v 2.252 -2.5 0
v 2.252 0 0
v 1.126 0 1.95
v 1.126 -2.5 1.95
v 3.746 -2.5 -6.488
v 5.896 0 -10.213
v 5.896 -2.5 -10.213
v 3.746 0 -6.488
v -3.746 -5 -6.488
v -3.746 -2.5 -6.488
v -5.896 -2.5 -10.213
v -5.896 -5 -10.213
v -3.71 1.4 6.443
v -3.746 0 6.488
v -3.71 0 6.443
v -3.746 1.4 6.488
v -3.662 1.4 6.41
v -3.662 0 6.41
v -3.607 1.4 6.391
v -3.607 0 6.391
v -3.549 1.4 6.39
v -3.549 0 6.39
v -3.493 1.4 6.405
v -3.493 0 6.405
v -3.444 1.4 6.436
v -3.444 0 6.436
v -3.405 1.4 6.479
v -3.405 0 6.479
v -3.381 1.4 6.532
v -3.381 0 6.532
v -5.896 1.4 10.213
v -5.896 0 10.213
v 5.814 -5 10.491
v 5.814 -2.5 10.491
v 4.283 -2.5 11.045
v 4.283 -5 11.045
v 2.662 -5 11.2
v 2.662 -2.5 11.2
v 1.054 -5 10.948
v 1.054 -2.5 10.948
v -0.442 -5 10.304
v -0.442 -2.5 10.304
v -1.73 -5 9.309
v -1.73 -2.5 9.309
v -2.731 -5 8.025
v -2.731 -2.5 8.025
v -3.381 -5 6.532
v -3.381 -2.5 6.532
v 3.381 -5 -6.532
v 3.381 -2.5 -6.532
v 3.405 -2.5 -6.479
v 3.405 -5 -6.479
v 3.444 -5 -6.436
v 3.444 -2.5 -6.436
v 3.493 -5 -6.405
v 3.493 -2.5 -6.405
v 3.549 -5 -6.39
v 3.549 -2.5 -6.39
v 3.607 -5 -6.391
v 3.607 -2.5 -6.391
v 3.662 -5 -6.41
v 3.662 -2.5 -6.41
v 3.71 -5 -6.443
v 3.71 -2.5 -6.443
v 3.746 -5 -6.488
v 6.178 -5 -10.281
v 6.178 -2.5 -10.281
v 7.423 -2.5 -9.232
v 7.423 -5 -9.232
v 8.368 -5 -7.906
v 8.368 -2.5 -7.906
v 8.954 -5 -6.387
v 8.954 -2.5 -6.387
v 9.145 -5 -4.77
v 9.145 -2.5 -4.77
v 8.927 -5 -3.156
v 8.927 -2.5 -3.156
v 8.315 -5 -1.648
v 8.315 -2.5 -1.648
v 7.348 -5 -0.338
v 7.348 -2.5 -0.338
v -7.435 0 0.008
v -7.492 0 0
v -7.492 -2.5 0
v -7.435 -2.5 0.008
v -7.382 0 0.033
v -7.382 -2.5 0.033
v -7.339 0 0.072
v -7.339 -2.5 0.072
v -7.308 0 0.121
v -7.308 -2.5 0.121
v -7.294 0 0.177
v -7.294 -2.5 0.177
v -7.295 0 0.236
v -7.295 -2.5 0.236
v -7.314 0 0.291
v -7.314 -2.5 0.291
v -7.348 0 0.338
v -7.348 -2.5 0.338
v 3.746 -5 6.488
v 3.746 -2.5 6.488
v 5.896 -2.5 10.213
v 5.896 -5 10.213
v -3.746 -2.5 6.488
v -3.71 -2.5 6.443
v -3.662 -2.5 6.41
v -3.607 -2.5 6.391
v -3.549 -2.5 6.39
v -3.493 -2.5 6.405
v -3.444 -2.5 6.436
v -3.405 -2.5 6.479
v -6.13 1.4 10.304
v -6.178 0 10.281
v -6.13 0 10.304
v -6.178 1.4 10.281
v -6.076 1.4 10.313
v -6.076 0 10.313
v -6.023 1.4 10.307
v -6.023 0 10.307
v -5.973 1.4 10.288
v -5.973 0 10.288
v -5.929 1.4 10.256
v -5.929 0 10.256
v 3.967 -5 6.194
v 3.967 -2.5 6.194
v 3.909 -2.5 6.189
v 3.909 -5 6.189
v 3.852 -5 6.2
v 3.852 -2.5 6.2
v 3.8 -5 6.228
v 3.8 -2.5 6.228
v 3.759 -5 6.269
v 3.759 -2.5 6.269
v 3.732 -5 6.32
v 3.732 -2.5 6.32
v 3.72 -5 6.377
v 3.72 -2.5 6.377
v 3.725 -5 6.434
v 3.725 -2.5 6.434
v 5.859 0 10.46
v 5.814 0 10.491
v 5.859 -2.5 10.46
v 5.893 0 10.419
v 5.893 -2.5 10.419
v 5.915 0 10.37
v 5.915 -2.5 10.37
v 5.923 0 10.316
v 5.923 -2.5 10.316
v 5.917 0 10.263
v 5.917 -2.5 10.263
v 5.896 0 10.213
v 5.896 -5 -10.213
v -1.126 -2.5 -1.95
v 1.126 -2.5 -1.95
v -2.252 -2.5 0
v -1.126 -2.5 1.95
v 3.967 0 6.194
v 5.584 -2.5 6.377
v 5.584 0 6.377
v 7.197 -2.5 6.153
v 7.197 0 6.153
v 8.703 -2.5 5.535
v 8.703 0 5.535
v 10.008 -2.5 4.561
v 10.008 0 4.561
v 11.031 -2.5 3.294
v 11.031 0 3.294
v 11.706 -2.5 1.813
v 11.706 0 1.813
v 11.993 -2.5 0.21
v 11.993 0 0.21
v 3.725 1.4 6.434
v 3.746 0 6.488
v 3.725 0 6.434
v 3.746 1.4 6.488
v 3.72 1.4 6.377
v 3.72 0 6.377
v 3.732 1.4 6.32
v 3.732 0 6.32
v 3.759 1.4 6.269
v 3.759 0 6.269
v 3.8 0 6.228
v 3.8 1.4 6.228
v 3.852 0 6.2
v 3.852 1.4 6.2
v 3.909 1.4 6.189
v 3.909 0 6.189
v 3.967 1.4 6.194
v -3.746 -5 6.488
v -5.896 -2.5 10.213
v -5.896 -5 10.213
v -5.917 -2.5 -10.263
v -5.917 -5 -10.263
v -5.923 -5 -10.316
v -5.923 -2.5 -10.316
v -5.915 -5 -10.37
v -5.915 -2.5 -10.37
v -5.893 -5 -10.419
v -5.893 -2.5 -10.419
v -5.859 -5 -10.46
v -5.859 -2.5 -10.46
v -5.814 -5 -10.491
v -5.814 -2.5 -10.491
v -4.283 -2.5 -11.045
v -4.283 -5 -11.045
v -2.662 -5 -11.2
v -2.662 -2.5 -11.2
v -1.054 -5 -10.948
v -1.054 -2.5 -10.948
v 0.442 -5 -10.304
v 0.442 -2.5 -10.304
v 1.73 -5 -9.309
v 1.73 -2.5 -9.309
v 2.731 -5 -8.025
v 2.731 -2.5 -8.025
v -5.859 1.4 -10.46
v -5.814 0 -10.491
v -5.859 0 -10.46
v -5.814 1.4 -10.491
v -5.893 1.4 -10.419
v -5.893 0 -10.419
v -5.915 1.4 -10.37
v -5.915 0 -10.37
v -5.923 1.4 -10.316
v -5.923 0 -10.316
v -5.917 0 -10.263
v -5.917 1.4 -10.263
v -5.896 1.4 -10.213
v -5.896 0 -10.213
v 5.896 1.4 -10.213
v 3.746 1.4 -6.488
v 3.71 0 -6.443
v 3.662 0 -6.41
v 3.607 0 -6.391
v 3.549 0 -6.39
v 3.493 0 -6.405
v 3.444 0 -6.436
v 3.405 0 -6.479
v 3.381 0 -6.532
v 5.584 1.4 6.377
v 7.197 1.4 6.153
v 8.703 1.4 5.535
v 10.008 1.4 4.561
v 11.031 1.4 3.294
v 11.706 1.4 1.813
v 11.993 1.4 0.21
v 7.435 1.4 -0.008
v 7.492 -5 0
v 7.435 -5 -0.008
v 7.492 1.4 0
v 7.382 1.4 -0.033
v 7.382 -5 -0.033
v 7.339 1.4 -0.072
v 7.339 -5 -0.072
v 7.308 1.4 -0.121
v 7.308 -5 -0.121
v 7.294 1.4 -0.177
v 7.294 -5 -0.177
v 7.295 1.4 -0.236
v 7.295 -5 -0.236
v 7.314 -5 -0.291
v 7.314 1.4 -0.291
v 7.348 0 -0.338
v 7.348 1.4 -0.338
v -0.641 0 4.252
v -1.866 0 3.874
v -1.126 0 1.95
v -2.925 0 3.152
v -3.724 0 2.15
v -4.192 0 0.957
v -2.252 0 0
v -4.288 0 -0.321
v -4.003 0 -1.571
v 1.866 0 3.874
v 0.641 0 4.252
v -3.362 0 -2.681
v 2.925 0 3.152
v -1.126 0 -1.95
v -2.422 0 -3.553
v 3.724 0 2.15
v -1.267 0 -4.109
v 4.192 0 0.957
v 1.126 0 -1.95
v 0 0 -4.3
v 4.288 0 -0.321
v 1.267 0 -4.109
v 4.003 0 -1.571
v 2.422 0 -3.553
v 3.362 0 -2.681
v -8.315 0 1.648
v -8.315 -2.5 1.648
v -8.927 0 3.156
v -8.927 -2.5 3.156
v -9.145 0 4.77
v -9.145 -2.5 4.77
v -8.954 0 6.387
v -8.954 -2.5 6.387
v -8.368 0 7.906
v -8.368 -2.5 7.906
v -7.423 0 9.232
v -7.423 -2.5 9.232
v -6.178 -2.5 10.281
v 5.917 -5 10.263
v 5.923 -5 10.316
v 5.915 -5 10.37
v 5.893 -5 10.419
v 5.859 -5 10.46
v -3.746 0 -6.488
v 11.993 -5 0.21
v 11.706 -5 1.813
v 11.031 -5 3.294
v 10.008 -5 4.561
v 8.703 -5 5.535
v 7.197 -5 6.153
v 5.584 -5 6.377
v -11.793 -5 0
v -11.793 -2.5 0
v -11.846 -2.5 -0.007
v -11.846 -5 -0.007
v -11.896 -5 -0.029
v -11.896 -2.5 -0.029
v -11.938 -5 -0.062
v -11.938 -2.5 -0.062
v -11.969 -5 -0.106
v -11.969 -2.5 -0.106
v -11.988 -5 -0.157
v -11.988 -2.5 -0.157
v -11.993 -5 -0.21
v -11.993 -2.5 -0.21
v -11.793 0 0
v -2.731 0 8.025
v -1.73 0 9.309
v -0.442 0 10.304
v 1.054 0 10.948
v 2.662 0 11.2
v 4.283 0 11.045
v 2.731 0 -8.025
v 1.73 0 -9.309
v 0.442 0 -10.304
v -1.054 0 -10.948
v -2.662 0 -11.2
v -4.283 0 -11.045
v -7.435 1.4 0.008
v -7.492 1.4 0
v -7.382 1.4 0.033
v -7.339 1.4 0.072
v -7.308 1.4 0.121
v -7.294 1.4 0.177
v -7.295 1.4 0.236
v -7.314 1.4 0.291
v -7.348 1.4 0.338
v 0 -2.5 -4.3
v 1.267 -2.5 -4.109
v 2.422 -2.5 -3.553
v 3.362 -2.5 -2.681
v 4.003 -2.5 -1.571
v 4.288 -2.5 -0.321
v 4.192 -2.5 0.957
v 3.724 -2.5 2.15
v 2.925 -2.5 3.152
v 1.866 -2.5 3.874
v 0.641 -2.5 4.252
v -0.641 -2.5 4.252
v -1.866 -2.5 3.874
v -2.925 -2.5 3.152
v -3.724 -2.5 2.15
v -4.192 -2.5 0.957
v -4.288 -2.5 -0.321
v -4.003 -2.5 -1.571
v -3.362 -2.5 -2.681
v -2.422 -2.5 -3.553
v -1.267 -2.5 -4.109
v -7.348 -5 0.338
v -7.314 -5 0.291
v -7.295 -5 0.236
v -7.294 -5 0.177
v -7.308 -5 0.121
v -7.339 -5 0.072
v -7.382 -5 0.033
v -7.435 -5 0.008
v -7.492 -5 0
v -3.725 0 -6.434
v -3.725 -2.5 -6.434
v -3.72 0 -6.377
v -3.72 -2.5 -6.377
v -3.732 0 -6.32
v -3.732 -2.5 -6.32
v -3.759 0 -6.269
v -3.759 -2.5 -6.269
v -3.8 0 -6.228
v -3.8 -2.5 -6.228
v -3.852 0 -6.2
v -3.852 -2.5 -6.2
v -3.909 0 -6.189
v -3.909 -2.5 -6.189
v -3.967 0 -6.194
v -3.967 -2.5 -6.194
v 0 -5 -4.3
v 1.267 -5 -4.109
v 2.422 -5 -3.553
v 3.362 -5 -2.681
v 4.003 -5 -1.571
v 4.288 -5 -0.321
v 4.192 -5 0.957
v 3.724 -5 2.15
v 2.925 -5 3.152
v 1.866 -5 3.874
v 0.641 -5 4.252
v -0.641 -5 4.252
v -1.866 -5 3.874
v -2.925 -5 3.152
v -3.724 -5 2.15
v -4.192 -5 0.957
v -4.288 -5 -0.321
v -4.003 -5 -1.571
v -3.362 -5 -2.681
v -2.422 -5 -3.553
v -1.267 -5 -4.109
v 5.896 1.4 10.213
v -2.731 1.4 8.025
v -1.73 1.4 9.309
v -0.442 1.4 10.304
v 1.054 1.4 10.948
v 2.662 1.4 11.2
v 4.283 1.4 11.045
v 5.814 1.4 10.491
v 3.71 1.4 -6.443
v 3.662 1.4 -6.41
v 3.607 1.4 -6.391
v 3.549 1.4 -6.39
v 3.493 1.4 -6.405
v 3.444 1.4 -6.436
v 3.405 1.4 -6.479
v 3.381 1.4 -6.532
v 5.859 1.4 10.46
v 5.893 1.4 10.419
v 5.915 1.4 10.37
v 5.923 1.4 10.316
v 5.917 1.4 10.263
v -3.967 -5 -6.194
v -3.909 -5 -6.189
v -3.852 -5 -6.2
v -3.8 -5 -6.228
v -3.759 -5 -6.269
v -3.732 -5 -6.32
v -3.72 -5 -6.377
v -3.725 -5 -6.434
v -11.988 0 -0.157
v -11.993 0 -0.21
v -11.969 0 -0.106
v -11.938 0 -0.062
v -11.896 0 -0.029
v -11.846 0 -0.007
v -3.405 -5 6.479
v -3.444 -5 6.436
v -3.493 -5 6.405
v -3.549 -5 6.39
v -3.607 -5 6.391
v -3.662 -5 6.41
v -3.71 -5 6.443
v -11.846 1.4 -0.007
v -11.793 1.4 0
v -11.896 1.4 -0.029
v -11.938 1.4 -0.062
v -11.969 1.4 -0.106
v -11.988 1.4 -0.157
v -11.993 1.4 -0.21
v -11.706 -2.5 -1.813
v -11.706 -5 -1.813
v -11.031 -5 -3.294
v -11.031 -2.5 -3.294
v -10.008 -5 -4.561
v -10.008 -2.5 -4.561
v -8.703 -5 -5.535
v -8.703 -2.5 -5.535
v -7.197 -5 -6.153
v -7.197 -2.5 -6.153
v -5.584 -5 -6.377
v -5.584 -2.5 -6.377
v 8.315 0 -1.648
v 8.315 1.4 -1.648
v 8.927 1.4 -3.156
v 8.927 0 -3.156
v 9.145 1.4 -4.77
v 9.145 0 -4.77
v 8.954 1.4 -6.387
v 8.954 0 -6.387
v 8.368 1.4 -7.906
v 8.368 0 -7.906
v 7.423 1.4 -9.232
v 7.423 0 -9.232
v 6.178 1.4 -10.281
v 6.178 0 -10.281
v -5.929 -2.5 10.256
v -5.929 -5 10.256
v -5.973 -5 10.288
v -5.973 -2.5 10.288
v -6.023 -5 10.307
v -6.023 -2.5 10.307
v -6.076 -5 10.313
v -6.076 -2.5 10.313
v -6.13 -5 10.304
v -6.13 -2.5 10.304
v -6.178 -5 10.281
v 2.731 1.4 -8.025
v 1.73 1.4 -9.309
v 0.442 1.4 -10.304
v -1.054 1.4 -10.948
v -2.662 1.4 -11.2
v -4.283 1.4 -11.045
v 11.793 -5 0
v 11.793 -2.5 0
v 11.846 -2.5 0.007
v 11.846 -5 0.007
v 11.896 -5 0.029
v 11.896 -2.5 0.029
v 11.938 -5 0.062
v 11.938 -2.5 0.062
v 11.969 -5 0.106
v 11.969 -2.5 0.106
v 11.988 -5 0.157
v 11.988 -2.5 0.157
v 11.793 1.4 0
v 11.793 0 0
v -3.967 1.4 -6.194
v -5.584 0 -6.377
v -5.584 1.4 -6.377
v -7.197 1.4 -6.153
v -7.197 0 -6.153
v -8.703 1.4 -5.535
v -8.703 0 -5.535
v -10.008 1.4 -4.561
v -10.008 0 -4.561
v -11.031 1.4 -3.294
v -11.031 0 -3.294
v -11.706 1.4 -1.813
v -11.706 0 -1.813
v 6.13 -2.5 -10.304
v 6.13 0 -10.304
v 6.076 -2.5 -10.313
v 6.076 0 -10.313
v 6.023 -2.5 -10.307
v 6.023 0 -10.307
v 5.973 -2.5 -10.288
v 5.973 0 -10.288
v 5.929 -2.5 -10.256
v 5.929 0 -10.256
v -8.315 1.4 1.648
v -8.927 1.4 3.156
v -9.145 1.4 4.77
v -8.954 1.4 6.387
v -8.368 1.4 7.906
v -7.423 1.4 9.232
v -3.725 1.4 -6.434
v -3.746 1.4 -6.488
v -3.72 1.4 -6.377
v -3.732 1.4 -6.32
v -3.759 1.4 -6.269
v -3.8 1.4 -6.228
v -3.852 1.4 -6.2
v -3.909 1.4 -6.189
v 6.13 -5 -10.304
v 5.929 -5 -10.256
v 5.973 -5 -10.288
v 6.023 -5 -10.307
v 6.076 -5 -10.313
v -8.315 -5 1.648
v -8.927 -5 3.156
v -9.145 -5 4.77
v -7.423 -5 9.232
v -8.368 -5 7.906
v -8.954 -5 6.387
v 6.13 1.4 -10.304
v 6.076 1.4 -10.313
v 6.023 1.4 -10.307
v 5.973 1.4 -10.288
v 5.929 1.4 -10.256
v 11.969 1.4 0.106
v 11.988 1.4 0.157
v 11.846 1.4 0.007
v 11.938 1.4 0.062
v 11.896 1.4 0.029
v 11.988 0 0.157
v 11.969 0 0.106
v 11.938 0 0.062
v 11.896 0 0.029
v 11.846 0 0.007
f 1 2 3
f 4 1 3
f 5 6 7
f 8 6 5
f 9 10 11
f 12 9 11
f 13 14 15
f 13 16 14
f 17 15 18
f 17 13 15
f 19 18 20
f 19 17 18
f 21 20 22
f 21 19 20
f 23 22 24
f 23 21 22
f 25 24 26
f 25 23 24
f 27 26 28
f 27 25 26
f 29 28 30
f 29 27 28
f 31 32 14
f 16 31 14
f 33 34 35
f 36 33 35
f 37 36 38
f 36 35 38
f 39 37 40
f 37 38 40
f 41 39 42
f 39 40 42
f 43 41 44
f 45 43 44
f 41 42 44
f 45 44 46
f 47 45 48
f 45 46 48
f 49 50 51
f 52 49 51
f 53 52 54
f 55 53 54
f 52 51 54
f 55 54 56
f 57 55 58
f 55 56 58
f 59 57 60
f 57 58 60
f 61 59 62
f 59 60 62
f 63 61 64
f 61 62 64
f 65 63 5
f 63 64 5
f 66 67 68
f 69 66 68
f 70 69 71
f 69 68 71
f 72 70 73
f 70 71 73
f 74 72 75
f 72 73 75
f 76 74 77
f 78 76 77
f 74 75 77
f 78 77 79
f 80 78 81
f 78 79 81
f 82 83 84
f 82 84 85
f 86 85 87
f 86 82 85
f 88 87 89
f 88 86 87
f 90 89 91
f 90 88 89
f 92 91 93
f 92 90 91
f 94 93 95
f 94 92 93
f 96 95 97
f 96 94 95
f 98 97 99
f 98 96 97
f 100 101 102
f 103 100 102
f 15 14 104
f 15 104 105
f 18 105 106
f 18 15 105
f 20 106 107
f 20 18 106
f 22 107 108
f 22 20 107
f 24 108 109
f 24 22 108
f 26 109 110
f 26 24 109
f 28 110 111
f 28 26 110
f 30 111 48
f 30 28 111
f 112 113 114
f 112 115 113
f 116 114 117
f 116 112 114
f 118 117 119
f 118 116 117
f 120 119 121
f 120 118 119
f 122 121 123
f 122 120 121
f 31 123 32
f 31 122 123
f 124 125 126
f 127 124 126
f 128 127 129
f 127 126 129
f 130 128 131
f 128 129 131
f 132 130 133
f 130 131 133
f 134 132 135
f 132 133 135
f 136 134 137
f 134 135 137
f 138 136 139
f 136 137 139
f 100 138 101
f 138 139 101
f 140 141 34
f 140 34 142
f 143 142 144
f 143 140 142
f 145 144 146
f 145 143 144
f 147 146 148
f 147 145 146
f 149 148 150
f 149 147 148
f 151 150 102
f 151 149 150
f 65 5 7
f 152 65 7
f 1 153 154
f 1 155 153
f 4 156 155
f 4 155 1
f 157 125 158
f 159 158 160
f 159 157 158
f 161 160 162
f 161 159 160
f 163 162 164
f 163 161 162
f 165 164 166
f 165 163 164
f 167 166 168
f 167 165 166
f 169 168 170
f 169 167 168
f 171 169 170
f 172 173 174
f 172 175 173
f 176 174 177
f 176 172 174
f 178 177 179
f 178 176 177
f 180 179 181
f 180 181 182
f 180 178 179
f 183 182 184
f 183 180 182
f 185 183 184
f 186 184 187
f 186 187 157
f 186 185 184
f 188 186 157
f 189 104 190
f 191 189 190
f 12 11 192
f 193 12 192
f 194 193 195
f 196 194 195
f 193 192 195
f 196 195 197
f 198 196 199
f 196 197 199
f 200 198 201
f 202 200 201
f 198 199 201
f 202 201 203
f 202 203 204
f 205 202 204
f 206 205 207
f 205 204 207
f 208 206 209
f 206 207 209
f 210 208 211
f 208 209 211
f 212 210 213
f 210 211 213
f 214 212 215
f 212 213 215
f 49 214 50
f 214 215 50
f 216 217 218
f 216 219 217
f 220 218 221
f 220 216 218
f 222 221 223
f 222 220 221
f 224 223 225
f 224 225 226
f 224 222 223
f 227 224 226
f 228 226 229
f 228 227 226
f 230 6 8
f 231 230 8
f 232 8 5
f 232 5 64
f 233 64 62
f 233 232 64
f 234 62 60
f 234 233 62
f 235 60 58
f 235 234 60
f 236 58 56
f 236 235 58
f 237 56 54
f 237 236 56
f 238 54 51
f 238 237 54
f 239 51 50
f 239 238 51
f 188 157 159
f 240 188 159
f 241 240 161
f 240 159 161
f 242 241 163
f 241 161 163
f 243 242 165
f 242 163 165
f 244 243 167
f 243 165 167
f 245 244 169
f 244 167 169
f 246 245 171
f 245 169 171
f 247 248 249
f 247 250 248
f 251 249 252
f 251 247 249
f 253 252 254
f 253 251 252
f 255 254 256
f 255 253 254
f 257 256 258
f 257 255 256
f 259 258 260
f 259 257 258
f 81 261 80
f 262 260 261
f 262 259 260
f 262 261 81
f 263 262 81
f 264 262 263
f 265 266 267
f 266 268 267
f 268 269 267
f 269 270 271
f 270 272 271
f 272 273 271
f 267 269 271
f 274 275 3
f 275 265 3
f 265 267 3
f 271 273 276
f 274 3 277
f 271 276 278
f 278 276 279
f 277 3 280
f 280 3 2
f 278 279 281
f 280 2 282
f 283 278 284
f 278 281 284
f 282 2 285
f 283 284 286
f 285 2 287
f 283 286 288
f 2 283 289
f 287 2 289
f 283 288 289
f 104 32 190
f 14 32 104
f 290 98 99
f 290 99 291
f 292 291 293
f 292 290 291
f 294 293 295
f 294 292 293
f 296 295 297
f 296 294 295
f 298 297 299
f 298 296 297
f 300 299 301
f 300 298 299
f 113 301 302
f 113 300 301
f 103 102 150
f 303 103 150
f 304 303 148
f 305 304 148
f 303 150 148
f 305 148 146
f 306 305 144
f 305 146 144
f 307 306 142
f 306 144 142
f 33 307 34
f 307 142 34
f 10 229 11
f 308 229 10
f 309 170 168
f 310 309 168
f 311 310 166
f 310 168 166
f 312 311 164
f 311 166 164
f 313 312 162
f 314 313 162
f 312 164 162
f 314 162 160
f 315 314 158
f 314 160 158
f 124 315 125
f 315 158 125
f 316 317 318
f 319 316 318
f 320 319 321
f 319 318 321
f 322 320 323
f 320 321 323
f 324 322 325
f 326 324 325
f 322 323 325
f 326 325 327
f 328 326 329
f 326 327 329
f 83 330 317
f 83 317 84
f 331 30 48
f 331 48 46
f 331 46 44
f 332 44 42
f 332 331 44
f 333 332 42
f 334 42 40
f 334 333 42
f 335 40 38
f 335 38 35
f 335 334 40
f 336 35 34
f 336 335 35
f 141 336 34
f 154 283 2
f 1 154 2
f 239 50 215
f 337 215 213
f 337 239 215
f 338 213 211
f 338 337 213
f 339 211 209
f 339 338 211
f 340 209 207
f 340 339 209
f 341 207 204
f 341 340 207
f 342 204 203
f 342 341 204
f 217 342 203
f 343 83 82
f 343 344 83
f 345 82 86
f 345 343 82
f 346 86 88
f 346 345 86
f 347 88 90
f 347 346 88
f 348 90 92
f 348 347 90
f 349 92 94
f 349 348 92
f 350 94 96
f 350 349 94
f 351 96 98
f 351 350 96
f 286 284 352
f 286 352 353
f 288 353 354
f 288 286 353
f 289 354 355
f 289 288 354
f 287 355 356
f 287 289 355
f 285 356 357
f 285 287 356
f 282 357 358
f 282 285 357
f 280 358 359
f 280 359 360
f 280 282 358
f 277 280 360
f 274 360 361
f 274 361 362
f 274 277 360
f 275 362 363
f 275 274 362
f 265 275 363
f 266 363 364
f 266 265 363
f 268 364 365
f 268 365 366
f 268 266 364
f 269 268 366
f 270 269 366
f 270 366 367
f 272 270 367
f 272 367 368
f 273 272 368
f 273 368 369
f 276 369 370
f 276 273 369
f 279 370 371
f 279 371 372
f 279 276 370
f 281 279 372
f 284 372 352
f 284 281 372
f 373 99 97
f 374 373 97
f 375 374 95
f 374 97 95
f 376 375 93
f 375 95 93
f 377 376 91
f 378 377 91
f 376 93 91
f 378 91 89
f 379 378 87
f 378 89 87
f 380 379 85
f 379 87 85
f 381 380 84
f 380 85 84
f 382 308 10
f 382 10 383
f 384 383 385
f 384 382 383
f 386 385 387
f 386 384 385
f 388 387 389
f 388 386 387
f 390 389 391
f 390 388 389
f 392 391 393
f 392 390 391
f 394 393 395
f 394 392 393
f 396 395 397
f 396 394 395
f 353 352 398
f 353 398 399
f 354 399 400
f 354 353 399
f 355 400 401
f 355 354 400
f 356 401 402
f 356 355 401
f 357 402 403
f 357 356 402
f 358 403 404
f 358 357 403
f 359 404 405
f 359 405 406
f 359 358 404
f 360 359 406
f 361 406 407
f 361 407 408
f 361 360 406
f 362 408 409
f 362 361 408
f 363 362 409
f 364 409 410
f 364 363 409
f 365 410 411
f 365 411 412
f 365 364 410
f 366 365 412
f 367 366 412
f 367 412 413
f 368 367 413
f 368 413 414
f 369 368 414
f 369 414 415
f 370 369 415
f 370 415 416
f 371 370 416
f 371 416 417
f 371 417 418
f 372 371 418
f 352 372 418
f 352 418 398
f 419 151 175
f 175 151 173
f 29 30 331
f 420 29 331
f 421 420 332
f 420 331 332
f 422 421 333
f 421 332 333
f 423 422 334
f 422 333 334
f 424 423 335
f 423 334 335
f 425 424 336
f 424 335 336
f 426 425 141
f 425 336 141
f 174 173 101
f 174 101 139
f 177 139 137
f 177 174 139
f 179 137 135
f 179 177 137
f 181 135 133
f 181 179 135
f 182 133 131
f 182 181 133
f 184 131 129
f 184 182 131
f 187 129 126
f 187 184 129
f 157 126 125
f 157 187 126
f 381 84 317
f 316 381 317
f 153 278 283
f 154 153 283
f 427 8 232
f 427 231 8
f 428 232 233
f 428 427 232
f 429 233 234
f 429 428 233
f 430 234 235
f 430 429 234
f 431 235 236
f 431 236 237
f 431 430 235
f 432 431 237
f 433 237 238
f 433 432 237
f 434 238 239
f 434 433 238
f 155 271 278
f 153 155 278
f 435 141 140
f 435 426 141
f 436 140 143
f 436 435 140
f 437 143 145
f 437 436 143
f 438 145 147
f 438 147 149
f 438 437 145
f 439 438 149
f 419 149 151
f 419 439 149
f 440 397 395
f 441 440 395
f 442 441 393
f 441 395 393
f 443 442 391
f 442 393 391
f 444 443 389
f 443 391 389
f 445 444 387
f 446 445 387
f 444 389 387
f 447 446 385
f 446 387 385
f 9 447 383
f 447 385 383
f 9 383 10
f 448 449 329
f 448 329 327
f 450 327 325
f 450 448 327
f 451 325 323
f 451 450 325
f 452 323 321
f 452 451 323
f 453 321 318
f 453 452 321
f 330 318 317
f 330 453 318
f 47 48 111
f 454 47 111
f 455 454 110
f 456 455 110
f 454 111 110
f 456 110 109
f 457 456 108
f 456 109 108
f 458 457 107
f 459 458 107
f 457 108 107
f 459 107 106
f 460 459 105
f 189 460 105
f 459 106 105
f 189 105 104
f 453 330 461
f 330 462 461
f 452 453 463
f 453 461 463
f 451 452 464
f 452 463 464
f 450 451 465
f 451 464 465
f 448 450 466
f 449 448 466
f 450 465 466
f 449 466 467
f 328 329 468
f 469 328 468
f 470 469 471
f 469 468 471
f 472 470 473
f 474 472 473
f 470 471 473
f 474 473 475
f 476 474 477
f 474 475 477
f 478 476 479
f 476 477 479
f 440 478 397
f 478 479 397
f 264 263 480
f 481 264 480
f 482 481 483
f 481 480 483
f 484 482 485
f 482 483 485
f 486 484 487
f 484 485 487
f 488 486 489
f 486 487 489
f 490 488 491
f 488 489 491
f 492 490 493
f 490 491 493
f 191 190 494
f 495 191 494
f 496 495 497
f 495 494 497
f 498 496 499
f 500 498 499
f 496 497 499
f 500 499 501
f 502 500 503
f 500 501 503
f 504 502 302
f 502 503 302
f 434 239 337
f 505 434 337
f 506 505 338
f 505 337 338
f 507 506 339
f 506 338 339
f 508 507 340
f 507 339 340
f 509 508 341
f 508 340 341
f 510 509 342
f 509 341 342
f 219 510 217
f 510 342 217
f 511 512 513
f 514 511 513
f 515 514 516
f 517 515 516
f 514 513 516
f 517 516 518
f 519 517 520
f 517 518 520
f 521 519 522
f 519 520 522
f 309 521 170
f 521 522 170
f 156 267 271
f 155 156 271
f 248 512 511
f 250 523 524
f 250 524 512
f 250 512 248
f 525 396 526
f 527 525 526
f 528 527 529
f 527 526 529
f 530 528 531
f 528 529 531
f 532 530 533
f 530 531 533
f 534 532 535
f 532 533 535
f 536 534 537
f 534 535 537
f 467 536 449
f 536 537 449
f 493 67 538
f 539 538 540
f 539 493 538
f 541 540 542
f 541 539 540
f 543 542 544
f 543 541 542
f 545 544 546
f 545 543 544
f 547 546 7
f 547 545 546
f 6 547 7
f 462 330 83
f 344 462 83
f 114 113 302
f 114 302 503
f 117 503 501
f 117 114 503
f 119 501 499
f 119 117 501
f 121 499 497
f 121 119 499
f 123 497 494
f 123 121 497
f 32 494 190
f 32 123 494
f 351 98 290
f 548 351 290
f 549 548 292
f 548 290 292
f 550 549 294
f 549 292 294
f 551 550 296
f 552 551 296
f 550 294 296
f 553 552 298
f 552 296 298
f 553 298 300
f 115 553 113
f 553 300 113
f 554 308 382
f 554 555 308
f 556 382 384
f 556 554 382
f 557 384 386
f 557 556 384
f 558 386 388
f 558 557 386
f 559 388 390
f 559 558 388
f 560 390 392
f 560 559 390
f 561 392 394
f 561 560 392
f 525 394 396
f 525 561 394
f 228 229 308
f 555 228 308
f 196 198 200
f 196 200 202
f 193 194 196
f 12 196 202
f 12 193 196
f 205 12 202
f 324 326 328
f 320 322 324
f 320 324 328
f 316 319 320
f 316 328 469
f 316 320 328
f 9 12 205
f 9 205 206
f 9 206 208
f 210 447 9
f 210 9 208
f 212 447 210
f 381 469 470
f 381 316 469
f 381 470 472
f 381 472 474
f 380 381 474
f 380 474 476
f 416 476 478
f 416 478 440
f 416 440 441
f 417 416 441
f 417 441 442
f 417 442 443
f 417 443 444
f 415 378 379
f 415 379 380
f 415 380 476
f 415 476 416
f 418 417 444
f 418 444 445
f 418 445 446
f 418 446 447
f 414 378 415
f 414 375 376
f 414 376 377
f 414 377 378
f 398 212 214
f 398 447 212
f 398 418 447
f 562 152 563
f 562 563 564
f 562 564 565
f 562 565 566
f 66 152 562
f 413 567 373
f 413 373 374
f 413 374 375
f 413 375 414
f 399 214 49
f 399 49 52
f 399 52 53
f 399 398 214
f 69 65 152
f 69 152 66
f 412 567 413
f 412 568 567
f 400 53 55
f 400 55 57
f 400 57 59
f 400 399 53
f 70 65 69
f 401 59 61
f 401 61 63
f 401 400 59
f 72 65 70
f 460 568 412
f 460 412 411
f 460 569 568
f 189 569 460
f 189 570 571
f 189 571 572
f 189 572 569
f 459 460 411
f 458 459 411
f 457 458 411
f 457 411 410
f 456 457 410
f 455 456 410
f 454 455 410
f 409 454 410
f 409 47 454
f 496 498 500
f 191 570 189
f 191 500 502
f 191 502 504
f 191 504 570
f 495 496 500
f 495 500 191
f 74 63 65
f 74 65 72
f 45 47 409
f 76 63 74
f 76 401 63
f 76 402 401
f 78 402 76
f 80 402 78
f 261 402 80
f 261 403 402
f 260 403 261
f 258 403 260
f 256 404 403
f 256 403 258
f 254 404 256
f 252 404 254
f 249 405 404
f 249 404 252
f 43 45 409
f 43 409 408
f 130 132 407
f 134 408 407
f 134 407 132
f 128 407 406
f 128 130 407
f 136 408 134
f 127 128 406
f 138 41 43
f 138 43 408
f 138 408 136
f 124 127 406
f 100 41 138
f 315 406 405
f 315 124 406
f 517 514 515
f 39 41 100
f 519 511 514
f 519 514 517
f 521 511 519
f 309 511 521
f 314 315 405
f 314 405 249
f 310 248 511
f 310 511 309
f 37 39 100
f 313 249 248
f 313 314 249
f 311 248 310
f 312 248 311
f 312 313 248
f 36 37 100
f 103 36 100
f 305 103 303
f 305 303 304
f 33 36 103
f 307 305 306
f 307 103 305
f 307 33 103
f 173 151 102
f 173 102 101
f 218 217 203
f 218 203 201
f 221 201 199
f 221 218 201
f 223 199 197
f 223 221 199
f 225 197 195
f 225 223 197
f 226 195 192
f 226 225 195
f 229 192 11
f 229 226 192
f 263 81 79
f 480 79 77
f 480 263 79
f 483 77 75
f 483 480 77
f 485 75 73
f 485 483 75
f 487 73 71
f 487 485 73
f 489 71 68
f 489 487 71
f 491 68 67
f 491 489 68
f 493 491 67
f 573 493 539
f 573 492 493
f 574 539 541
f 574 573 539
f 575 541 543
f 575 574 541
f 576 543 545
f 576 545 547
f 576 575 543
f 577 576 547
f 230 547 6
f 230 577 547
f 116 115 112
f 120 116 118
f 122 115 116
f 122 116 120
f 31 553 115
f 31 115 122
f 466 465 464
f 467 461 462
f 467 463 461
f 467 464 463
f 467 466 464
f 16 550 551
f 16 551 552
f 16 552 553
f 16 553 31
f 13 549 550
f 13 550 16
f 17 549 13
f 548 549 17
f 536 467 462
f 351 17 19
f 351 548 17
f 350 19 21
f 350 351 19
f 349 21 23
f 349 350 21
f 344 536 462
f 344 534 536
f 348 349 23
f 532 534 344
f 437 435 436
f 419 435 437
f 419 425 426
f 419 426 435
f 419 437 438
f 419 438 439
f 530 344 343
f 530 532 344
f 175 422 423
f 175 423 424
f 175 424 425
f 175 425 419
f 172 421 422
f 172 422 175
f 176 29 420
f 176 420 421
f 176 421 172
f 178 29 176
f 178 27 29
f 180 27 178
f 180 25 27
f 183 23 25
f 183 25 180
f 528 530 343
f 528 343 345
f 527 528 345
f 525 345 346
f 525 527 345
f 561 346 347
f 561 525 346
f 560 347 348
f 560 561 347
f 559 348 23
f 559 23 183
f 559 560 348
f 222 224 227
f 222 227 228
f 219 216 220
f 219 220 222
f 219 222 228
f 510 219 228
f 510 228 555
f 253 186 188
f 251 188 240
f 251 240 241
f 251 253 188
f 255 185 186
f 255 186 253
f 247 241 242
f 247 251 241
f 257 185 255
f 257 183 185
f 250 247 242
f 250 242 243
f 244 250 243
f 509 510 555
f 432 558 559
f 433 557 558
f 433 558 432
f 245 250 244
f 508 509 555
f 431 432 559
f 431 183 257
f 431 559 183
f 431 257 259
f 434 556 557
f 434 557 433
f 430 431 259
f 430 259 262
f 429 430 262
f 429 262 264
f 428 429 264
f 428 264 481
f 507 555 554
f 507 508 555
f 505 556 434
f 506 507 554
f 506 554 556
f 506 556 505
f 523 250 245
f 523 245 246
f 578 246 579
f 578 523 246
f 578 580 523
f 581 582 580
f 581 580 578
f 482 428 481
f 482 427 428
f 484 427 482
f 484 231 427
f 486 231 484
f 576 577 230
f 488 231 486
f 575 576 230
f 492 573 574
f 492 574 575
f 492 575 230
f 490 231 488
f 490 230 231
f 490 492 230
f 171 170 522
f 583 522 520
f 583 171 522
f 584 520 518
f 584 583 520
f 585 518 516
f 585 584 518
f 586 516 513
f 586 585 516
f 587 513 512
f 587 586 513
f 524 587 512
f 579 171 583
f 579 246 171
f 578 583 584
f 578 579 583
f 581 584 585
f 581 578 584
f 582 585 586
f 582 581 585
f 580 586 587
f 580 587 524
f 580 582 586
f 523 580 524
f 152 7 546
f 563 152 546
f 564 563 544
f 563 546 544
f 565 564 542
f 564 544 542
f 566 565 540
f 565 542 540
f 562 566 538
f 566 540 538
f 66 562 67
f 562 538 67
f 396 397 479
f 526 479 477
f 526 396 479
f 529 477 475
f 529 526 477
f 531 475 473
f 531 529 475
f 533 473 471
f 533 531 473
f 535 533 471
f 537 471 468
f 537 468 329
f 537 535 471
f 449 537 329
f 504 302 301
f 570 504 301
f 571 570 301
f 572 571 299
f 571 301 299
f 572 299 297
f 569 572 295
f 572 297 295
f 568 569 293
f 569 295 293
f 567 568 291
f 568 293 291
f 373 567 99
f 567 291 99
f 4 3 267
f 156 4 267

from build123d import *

# Parameters (mm, degrees)
BOSS_EXTRUDE1_DEPTH = 1.4
FILLET1_R           = 0.2
SKETCH2_R           = 4.3
BOSS_EXTRUDE2_DEPTH = 2.5
SKETCH2_3_R         = 4.3
BOSS_EXTRUDE3_DEPTH = 5


with BuildPart() as part:
    # Sketch1 → Boss-Extrude1 (new body)
    with BuildSketch(Plane(origin=(0, 0, 0), x_dir=(1, 0, 0), z_dir=(0, 1, 0))):
        with BuildLine():
            ThreePointArc((-6, -10.392304845), (-9.114938352, -5.447774983), (-7, 0))
            Line((-7, 0), (-12, 0))
            ThreePointArc((-12, 0), (-9.275380706, 5.169880676), (-3.5, 6.062177826))
            Line((-3.5, 6.062177826), (-6, 10.392304845))
            ThreePointArc((-6, 10.392304845), (-0.160442353, 10.617655659), (3.5, 6.062177826))
            Line((3.5, 6.062177826), (6, 10.392304845))
            ThreePointArc((6, 10.392304845), (9.114938352, 5.447774983), (7, 0))
            Line((7, 0), (12, 0))
            ThreePointArc((12, 0), (9.275380706, -5.169880676), (3.5, -6.062177826))
            Line((3.5, -6.062177826), (6, -10.392304845))
            ThreePointArc((6, -10.392304845), (0.160442353, -10.617655659), (-3.5, -6.062177826))
            Line((-3.5, -6.062177826), (-6, -10.392304845))
        make_face()
    extrude(amount=BOSS_EXTRUDE1_DEPTH)

    # Fillet1
    fillet1_edges = [part.edges().sort_by_distance(p)[0] for p in [
        (7, 0.7, 0),
        (12, 0.7, 0),
        (3.5, 0.7, 6.062177826),
        (6, 0.7, 10.392304845),
        (-3.5, 0.7, 6.062177826),
        (-6, 0.7, 10.392304845),
        (-7, 0.7, 0),
        (-12, 0.7, 0),
        (-3.5, 0.7, -6.062177826),
        (-6, 0.7, -10.392304845),
        (3.5, 0.7, -6.062177826),
        (6, 0.7, -10.392304845),
    ]]
    fillet(fillet1_edges, radius=FILLET1_R)

    # Sketch2 → Boss-Extrude2 (add)
    # profile 1 of 2: a face of its own
    with BuildSketch(Plane.XZ):
        with BuildLine():
            ThreePointArc((7.3475601, -0.33806531), (7.308394161, -0.121301404), (7.492259685, 0))
            Line((7.492259685, 0), (11.792907204, 0))
            ThreePointArc((11.792907204, 0), (11.937898824, 0.062241407), (11.99264562, 0.2102257))
            ThreePointArc((11.99264562, 0.2102257), (9.386315888, 5.088980867), (3.966553197, 6.194141047))
            ThreePointArc((3.966553197, 6.194141047), (3.759247178, 6.268604302), (3.746129843, 6.488487219))
            Line((3.746129843, 6.488487219), (5.896453602, 10.212957223))
            ThreePointArc((5.896453602, 10.212957223), (5.915046773, 10.369644353), (5.814262013, 10.491048616))
            ThreePointArc((5.814262013, 10.491048616), (0.285971234, 10.673278441), (-3.381006903, 6.532206358))
            ThreePointArc((-3.381006903, 6.532206358), (-3.549146983, 6.389905707), (-3.746129843, 6.488487219))
            Line((-3.746129843, 6.488487219), (-5.896453602, 10.212957223))
            ThreePointArc((-5.896453602, 10.212957223), (-6.022852052, 10.307402946), (-6.178383607, 10.280822916))
            ThreePointArc((-6.178383607, 10.280822916), (-9.100344655, 5.584297574), (-7.3475601, 0.33806531))
            ThreePointArc((-7.3475601, 0.33806531), (-7.308394161, 0.121301404), (-7.492259685, 0))
            Line((-7.492259685, 0), (-11.792907204, 0))
            ThreePointArc((-11.792907204, 0), (-11.937898824, -0.062241407), (-11.99264562, -0.2102257))
            ThreePointArc((-11.99264562, -0.2102257), (-9.386315888, -5.088980867), (-3.966553197, -6.194141047))
            ThreePointArc((-3.966553197, -6.194141047), (-3.759247178, -6.268604302), (-3.746129843, -6.488487219))
            Line((-3.746129843, -6.488487219), (-5.896453602, -10.212957223))
            ThreePointArc((-5.896453602, -10.212957223), (-5.915046773, -10.369644353), (-5.814262013, -10.491048616))
            ThreePointArc((-5.814262013, -10.491048616), (-0.285971234, -10.673278441), (3.381006903, -6.532206358))
            ThreePointArc((3.381006903, -6.532206358), (3.549146983, -6.389905707), (3.746129843, -6.488487219))
            Line((3.746129843, -6.488487219), (5.896453602, -10.212957223))
            ThreePointArc((5.896453602, -10.212957223), (6.022852052, -10.307402946), (6.178383607, -10.280822916))
            ThreePointArc((6.178383607, -10.280822916), (9.100344655, -5.584297574), (7.3475601, -0.33806531))
        make_face()
        Circle(SKETCH2_R, mode=Mode.SUBTRACT)
    # profile 2 of 2: a face of its own
    with BuildSketch(Plane.XZ):
        Polygon((1.125833025, -1.95), (2.25166605, 0), (1.125833025, 1.95), (-1.125833025, 1.95), (-2.25166605, 0), (-1.125833025, -1.95), align=None)
    extrude(amount=BOSS_EXTRUDE2_DEPTH)

    # Sketch2<3> → Boss-Extrude3 (add)
    with BuildSketch(Plane.XZ):
        with BuildLine():
            ThreePointArc((7.3475601, -0.33806531), (7.308394161, -0.121301404), (7.492259685, 0))
            Line((7.492259685, 0), (11.792907204, 0))
            ThreePointArc((11.792907204, 0), (11.937898824, 0.062241407), (11.99264562, 0.2102257))
            ThreePointArc((11.99264562, 0.2102257), (9.386315888, 5.088980867), (3.966553197, 6.194141047))
            ThreePointArc((3.966553197, 6.194141047), (3.759247178, 6.268604302), (3.746129843, 6.488487219))
            Line((3.746129843, 6.488487219), (5.896453602, 10.212957223))
            ThreePointArc((5.896453602, 10.212957223), (5.915046773, 10.369644353), (5.814262013, 10.491048616))
            ThreePointArc((5.814262013, 10.491048616), (0.285971234, 10.673278441), (-3.381006903, 6.532206358))
            ThreePointArc((-3.381006903, 6.532206358), (-3.549146983, 6.389905707), (-3.746129843, 6.488487219))
            Line((-3.746129843, 6.488487219), (-5.896453602, 10.212957223))
            ThreePointArc((-5.896453602, 10.212957223), (-6.022852052, 10.307402946), (-6.178383607, 10.280822916))
            ThreePointArc((-6.178383607, 10.280822916), (-9.100344655, 5.584297574), (-7.3475601, 0.33806531))
            ThreePointArc((-7.3475601, 0.33806531), (-7.308394161, 0.121301404), (-7.492259685, 0))
            Line((-7.492259685, 0), (-11.792907204, 0))
            ThreePointArc((-11.792907204, 0), (-11.937898824, -0.062241407), (-11.99264562, -0.2102257))
            ThreePointArc((-11.99264562, -0.2102257), (-9.386315888, -5.088980867), (-3.966553197, -6.194141047))
            ThreePointArc((-3.966553197, -6.194141047), (-3.759247178, -6.268604302), (-3.746129843, -6.488487219))
            Line((-3.746129843, -6.488487219), (-5.896453602, -10.212957223))
            ThreePointArc((-5.896453602, -10.212957223), (-5.915046773, -10.369644353), (-5.814262013, -10.491048616))
            ThreePointArc((-5.814262013, -10.491048616), (-0.285971234, -10.673278441), (3.381006903, -6.532206358))
            ThreePointArc((3.381006903, -6.532206358), (3.549146983, -6.389905707), (3.746129843, -6.488487219))
            Line((3.746129843, -6.488487219), (5.896453602, -10.212957223))
            ThreePointArc((5.896453602, -10.212957223), (6.022852052, -10.307402946), (6.178383607, -10.280822916))
            ThreePointArc((6.178383607, -10.280822916), (9.100344655, -5.584297574), (7.3475601, -0.33806531))
        make_face()
        Circle(SKETCH2_3_R, mode=Mode.SUBTRACT)
    extrude(amount=BOSS_EXTRUDE3_DEPTH)


solid = part.part
